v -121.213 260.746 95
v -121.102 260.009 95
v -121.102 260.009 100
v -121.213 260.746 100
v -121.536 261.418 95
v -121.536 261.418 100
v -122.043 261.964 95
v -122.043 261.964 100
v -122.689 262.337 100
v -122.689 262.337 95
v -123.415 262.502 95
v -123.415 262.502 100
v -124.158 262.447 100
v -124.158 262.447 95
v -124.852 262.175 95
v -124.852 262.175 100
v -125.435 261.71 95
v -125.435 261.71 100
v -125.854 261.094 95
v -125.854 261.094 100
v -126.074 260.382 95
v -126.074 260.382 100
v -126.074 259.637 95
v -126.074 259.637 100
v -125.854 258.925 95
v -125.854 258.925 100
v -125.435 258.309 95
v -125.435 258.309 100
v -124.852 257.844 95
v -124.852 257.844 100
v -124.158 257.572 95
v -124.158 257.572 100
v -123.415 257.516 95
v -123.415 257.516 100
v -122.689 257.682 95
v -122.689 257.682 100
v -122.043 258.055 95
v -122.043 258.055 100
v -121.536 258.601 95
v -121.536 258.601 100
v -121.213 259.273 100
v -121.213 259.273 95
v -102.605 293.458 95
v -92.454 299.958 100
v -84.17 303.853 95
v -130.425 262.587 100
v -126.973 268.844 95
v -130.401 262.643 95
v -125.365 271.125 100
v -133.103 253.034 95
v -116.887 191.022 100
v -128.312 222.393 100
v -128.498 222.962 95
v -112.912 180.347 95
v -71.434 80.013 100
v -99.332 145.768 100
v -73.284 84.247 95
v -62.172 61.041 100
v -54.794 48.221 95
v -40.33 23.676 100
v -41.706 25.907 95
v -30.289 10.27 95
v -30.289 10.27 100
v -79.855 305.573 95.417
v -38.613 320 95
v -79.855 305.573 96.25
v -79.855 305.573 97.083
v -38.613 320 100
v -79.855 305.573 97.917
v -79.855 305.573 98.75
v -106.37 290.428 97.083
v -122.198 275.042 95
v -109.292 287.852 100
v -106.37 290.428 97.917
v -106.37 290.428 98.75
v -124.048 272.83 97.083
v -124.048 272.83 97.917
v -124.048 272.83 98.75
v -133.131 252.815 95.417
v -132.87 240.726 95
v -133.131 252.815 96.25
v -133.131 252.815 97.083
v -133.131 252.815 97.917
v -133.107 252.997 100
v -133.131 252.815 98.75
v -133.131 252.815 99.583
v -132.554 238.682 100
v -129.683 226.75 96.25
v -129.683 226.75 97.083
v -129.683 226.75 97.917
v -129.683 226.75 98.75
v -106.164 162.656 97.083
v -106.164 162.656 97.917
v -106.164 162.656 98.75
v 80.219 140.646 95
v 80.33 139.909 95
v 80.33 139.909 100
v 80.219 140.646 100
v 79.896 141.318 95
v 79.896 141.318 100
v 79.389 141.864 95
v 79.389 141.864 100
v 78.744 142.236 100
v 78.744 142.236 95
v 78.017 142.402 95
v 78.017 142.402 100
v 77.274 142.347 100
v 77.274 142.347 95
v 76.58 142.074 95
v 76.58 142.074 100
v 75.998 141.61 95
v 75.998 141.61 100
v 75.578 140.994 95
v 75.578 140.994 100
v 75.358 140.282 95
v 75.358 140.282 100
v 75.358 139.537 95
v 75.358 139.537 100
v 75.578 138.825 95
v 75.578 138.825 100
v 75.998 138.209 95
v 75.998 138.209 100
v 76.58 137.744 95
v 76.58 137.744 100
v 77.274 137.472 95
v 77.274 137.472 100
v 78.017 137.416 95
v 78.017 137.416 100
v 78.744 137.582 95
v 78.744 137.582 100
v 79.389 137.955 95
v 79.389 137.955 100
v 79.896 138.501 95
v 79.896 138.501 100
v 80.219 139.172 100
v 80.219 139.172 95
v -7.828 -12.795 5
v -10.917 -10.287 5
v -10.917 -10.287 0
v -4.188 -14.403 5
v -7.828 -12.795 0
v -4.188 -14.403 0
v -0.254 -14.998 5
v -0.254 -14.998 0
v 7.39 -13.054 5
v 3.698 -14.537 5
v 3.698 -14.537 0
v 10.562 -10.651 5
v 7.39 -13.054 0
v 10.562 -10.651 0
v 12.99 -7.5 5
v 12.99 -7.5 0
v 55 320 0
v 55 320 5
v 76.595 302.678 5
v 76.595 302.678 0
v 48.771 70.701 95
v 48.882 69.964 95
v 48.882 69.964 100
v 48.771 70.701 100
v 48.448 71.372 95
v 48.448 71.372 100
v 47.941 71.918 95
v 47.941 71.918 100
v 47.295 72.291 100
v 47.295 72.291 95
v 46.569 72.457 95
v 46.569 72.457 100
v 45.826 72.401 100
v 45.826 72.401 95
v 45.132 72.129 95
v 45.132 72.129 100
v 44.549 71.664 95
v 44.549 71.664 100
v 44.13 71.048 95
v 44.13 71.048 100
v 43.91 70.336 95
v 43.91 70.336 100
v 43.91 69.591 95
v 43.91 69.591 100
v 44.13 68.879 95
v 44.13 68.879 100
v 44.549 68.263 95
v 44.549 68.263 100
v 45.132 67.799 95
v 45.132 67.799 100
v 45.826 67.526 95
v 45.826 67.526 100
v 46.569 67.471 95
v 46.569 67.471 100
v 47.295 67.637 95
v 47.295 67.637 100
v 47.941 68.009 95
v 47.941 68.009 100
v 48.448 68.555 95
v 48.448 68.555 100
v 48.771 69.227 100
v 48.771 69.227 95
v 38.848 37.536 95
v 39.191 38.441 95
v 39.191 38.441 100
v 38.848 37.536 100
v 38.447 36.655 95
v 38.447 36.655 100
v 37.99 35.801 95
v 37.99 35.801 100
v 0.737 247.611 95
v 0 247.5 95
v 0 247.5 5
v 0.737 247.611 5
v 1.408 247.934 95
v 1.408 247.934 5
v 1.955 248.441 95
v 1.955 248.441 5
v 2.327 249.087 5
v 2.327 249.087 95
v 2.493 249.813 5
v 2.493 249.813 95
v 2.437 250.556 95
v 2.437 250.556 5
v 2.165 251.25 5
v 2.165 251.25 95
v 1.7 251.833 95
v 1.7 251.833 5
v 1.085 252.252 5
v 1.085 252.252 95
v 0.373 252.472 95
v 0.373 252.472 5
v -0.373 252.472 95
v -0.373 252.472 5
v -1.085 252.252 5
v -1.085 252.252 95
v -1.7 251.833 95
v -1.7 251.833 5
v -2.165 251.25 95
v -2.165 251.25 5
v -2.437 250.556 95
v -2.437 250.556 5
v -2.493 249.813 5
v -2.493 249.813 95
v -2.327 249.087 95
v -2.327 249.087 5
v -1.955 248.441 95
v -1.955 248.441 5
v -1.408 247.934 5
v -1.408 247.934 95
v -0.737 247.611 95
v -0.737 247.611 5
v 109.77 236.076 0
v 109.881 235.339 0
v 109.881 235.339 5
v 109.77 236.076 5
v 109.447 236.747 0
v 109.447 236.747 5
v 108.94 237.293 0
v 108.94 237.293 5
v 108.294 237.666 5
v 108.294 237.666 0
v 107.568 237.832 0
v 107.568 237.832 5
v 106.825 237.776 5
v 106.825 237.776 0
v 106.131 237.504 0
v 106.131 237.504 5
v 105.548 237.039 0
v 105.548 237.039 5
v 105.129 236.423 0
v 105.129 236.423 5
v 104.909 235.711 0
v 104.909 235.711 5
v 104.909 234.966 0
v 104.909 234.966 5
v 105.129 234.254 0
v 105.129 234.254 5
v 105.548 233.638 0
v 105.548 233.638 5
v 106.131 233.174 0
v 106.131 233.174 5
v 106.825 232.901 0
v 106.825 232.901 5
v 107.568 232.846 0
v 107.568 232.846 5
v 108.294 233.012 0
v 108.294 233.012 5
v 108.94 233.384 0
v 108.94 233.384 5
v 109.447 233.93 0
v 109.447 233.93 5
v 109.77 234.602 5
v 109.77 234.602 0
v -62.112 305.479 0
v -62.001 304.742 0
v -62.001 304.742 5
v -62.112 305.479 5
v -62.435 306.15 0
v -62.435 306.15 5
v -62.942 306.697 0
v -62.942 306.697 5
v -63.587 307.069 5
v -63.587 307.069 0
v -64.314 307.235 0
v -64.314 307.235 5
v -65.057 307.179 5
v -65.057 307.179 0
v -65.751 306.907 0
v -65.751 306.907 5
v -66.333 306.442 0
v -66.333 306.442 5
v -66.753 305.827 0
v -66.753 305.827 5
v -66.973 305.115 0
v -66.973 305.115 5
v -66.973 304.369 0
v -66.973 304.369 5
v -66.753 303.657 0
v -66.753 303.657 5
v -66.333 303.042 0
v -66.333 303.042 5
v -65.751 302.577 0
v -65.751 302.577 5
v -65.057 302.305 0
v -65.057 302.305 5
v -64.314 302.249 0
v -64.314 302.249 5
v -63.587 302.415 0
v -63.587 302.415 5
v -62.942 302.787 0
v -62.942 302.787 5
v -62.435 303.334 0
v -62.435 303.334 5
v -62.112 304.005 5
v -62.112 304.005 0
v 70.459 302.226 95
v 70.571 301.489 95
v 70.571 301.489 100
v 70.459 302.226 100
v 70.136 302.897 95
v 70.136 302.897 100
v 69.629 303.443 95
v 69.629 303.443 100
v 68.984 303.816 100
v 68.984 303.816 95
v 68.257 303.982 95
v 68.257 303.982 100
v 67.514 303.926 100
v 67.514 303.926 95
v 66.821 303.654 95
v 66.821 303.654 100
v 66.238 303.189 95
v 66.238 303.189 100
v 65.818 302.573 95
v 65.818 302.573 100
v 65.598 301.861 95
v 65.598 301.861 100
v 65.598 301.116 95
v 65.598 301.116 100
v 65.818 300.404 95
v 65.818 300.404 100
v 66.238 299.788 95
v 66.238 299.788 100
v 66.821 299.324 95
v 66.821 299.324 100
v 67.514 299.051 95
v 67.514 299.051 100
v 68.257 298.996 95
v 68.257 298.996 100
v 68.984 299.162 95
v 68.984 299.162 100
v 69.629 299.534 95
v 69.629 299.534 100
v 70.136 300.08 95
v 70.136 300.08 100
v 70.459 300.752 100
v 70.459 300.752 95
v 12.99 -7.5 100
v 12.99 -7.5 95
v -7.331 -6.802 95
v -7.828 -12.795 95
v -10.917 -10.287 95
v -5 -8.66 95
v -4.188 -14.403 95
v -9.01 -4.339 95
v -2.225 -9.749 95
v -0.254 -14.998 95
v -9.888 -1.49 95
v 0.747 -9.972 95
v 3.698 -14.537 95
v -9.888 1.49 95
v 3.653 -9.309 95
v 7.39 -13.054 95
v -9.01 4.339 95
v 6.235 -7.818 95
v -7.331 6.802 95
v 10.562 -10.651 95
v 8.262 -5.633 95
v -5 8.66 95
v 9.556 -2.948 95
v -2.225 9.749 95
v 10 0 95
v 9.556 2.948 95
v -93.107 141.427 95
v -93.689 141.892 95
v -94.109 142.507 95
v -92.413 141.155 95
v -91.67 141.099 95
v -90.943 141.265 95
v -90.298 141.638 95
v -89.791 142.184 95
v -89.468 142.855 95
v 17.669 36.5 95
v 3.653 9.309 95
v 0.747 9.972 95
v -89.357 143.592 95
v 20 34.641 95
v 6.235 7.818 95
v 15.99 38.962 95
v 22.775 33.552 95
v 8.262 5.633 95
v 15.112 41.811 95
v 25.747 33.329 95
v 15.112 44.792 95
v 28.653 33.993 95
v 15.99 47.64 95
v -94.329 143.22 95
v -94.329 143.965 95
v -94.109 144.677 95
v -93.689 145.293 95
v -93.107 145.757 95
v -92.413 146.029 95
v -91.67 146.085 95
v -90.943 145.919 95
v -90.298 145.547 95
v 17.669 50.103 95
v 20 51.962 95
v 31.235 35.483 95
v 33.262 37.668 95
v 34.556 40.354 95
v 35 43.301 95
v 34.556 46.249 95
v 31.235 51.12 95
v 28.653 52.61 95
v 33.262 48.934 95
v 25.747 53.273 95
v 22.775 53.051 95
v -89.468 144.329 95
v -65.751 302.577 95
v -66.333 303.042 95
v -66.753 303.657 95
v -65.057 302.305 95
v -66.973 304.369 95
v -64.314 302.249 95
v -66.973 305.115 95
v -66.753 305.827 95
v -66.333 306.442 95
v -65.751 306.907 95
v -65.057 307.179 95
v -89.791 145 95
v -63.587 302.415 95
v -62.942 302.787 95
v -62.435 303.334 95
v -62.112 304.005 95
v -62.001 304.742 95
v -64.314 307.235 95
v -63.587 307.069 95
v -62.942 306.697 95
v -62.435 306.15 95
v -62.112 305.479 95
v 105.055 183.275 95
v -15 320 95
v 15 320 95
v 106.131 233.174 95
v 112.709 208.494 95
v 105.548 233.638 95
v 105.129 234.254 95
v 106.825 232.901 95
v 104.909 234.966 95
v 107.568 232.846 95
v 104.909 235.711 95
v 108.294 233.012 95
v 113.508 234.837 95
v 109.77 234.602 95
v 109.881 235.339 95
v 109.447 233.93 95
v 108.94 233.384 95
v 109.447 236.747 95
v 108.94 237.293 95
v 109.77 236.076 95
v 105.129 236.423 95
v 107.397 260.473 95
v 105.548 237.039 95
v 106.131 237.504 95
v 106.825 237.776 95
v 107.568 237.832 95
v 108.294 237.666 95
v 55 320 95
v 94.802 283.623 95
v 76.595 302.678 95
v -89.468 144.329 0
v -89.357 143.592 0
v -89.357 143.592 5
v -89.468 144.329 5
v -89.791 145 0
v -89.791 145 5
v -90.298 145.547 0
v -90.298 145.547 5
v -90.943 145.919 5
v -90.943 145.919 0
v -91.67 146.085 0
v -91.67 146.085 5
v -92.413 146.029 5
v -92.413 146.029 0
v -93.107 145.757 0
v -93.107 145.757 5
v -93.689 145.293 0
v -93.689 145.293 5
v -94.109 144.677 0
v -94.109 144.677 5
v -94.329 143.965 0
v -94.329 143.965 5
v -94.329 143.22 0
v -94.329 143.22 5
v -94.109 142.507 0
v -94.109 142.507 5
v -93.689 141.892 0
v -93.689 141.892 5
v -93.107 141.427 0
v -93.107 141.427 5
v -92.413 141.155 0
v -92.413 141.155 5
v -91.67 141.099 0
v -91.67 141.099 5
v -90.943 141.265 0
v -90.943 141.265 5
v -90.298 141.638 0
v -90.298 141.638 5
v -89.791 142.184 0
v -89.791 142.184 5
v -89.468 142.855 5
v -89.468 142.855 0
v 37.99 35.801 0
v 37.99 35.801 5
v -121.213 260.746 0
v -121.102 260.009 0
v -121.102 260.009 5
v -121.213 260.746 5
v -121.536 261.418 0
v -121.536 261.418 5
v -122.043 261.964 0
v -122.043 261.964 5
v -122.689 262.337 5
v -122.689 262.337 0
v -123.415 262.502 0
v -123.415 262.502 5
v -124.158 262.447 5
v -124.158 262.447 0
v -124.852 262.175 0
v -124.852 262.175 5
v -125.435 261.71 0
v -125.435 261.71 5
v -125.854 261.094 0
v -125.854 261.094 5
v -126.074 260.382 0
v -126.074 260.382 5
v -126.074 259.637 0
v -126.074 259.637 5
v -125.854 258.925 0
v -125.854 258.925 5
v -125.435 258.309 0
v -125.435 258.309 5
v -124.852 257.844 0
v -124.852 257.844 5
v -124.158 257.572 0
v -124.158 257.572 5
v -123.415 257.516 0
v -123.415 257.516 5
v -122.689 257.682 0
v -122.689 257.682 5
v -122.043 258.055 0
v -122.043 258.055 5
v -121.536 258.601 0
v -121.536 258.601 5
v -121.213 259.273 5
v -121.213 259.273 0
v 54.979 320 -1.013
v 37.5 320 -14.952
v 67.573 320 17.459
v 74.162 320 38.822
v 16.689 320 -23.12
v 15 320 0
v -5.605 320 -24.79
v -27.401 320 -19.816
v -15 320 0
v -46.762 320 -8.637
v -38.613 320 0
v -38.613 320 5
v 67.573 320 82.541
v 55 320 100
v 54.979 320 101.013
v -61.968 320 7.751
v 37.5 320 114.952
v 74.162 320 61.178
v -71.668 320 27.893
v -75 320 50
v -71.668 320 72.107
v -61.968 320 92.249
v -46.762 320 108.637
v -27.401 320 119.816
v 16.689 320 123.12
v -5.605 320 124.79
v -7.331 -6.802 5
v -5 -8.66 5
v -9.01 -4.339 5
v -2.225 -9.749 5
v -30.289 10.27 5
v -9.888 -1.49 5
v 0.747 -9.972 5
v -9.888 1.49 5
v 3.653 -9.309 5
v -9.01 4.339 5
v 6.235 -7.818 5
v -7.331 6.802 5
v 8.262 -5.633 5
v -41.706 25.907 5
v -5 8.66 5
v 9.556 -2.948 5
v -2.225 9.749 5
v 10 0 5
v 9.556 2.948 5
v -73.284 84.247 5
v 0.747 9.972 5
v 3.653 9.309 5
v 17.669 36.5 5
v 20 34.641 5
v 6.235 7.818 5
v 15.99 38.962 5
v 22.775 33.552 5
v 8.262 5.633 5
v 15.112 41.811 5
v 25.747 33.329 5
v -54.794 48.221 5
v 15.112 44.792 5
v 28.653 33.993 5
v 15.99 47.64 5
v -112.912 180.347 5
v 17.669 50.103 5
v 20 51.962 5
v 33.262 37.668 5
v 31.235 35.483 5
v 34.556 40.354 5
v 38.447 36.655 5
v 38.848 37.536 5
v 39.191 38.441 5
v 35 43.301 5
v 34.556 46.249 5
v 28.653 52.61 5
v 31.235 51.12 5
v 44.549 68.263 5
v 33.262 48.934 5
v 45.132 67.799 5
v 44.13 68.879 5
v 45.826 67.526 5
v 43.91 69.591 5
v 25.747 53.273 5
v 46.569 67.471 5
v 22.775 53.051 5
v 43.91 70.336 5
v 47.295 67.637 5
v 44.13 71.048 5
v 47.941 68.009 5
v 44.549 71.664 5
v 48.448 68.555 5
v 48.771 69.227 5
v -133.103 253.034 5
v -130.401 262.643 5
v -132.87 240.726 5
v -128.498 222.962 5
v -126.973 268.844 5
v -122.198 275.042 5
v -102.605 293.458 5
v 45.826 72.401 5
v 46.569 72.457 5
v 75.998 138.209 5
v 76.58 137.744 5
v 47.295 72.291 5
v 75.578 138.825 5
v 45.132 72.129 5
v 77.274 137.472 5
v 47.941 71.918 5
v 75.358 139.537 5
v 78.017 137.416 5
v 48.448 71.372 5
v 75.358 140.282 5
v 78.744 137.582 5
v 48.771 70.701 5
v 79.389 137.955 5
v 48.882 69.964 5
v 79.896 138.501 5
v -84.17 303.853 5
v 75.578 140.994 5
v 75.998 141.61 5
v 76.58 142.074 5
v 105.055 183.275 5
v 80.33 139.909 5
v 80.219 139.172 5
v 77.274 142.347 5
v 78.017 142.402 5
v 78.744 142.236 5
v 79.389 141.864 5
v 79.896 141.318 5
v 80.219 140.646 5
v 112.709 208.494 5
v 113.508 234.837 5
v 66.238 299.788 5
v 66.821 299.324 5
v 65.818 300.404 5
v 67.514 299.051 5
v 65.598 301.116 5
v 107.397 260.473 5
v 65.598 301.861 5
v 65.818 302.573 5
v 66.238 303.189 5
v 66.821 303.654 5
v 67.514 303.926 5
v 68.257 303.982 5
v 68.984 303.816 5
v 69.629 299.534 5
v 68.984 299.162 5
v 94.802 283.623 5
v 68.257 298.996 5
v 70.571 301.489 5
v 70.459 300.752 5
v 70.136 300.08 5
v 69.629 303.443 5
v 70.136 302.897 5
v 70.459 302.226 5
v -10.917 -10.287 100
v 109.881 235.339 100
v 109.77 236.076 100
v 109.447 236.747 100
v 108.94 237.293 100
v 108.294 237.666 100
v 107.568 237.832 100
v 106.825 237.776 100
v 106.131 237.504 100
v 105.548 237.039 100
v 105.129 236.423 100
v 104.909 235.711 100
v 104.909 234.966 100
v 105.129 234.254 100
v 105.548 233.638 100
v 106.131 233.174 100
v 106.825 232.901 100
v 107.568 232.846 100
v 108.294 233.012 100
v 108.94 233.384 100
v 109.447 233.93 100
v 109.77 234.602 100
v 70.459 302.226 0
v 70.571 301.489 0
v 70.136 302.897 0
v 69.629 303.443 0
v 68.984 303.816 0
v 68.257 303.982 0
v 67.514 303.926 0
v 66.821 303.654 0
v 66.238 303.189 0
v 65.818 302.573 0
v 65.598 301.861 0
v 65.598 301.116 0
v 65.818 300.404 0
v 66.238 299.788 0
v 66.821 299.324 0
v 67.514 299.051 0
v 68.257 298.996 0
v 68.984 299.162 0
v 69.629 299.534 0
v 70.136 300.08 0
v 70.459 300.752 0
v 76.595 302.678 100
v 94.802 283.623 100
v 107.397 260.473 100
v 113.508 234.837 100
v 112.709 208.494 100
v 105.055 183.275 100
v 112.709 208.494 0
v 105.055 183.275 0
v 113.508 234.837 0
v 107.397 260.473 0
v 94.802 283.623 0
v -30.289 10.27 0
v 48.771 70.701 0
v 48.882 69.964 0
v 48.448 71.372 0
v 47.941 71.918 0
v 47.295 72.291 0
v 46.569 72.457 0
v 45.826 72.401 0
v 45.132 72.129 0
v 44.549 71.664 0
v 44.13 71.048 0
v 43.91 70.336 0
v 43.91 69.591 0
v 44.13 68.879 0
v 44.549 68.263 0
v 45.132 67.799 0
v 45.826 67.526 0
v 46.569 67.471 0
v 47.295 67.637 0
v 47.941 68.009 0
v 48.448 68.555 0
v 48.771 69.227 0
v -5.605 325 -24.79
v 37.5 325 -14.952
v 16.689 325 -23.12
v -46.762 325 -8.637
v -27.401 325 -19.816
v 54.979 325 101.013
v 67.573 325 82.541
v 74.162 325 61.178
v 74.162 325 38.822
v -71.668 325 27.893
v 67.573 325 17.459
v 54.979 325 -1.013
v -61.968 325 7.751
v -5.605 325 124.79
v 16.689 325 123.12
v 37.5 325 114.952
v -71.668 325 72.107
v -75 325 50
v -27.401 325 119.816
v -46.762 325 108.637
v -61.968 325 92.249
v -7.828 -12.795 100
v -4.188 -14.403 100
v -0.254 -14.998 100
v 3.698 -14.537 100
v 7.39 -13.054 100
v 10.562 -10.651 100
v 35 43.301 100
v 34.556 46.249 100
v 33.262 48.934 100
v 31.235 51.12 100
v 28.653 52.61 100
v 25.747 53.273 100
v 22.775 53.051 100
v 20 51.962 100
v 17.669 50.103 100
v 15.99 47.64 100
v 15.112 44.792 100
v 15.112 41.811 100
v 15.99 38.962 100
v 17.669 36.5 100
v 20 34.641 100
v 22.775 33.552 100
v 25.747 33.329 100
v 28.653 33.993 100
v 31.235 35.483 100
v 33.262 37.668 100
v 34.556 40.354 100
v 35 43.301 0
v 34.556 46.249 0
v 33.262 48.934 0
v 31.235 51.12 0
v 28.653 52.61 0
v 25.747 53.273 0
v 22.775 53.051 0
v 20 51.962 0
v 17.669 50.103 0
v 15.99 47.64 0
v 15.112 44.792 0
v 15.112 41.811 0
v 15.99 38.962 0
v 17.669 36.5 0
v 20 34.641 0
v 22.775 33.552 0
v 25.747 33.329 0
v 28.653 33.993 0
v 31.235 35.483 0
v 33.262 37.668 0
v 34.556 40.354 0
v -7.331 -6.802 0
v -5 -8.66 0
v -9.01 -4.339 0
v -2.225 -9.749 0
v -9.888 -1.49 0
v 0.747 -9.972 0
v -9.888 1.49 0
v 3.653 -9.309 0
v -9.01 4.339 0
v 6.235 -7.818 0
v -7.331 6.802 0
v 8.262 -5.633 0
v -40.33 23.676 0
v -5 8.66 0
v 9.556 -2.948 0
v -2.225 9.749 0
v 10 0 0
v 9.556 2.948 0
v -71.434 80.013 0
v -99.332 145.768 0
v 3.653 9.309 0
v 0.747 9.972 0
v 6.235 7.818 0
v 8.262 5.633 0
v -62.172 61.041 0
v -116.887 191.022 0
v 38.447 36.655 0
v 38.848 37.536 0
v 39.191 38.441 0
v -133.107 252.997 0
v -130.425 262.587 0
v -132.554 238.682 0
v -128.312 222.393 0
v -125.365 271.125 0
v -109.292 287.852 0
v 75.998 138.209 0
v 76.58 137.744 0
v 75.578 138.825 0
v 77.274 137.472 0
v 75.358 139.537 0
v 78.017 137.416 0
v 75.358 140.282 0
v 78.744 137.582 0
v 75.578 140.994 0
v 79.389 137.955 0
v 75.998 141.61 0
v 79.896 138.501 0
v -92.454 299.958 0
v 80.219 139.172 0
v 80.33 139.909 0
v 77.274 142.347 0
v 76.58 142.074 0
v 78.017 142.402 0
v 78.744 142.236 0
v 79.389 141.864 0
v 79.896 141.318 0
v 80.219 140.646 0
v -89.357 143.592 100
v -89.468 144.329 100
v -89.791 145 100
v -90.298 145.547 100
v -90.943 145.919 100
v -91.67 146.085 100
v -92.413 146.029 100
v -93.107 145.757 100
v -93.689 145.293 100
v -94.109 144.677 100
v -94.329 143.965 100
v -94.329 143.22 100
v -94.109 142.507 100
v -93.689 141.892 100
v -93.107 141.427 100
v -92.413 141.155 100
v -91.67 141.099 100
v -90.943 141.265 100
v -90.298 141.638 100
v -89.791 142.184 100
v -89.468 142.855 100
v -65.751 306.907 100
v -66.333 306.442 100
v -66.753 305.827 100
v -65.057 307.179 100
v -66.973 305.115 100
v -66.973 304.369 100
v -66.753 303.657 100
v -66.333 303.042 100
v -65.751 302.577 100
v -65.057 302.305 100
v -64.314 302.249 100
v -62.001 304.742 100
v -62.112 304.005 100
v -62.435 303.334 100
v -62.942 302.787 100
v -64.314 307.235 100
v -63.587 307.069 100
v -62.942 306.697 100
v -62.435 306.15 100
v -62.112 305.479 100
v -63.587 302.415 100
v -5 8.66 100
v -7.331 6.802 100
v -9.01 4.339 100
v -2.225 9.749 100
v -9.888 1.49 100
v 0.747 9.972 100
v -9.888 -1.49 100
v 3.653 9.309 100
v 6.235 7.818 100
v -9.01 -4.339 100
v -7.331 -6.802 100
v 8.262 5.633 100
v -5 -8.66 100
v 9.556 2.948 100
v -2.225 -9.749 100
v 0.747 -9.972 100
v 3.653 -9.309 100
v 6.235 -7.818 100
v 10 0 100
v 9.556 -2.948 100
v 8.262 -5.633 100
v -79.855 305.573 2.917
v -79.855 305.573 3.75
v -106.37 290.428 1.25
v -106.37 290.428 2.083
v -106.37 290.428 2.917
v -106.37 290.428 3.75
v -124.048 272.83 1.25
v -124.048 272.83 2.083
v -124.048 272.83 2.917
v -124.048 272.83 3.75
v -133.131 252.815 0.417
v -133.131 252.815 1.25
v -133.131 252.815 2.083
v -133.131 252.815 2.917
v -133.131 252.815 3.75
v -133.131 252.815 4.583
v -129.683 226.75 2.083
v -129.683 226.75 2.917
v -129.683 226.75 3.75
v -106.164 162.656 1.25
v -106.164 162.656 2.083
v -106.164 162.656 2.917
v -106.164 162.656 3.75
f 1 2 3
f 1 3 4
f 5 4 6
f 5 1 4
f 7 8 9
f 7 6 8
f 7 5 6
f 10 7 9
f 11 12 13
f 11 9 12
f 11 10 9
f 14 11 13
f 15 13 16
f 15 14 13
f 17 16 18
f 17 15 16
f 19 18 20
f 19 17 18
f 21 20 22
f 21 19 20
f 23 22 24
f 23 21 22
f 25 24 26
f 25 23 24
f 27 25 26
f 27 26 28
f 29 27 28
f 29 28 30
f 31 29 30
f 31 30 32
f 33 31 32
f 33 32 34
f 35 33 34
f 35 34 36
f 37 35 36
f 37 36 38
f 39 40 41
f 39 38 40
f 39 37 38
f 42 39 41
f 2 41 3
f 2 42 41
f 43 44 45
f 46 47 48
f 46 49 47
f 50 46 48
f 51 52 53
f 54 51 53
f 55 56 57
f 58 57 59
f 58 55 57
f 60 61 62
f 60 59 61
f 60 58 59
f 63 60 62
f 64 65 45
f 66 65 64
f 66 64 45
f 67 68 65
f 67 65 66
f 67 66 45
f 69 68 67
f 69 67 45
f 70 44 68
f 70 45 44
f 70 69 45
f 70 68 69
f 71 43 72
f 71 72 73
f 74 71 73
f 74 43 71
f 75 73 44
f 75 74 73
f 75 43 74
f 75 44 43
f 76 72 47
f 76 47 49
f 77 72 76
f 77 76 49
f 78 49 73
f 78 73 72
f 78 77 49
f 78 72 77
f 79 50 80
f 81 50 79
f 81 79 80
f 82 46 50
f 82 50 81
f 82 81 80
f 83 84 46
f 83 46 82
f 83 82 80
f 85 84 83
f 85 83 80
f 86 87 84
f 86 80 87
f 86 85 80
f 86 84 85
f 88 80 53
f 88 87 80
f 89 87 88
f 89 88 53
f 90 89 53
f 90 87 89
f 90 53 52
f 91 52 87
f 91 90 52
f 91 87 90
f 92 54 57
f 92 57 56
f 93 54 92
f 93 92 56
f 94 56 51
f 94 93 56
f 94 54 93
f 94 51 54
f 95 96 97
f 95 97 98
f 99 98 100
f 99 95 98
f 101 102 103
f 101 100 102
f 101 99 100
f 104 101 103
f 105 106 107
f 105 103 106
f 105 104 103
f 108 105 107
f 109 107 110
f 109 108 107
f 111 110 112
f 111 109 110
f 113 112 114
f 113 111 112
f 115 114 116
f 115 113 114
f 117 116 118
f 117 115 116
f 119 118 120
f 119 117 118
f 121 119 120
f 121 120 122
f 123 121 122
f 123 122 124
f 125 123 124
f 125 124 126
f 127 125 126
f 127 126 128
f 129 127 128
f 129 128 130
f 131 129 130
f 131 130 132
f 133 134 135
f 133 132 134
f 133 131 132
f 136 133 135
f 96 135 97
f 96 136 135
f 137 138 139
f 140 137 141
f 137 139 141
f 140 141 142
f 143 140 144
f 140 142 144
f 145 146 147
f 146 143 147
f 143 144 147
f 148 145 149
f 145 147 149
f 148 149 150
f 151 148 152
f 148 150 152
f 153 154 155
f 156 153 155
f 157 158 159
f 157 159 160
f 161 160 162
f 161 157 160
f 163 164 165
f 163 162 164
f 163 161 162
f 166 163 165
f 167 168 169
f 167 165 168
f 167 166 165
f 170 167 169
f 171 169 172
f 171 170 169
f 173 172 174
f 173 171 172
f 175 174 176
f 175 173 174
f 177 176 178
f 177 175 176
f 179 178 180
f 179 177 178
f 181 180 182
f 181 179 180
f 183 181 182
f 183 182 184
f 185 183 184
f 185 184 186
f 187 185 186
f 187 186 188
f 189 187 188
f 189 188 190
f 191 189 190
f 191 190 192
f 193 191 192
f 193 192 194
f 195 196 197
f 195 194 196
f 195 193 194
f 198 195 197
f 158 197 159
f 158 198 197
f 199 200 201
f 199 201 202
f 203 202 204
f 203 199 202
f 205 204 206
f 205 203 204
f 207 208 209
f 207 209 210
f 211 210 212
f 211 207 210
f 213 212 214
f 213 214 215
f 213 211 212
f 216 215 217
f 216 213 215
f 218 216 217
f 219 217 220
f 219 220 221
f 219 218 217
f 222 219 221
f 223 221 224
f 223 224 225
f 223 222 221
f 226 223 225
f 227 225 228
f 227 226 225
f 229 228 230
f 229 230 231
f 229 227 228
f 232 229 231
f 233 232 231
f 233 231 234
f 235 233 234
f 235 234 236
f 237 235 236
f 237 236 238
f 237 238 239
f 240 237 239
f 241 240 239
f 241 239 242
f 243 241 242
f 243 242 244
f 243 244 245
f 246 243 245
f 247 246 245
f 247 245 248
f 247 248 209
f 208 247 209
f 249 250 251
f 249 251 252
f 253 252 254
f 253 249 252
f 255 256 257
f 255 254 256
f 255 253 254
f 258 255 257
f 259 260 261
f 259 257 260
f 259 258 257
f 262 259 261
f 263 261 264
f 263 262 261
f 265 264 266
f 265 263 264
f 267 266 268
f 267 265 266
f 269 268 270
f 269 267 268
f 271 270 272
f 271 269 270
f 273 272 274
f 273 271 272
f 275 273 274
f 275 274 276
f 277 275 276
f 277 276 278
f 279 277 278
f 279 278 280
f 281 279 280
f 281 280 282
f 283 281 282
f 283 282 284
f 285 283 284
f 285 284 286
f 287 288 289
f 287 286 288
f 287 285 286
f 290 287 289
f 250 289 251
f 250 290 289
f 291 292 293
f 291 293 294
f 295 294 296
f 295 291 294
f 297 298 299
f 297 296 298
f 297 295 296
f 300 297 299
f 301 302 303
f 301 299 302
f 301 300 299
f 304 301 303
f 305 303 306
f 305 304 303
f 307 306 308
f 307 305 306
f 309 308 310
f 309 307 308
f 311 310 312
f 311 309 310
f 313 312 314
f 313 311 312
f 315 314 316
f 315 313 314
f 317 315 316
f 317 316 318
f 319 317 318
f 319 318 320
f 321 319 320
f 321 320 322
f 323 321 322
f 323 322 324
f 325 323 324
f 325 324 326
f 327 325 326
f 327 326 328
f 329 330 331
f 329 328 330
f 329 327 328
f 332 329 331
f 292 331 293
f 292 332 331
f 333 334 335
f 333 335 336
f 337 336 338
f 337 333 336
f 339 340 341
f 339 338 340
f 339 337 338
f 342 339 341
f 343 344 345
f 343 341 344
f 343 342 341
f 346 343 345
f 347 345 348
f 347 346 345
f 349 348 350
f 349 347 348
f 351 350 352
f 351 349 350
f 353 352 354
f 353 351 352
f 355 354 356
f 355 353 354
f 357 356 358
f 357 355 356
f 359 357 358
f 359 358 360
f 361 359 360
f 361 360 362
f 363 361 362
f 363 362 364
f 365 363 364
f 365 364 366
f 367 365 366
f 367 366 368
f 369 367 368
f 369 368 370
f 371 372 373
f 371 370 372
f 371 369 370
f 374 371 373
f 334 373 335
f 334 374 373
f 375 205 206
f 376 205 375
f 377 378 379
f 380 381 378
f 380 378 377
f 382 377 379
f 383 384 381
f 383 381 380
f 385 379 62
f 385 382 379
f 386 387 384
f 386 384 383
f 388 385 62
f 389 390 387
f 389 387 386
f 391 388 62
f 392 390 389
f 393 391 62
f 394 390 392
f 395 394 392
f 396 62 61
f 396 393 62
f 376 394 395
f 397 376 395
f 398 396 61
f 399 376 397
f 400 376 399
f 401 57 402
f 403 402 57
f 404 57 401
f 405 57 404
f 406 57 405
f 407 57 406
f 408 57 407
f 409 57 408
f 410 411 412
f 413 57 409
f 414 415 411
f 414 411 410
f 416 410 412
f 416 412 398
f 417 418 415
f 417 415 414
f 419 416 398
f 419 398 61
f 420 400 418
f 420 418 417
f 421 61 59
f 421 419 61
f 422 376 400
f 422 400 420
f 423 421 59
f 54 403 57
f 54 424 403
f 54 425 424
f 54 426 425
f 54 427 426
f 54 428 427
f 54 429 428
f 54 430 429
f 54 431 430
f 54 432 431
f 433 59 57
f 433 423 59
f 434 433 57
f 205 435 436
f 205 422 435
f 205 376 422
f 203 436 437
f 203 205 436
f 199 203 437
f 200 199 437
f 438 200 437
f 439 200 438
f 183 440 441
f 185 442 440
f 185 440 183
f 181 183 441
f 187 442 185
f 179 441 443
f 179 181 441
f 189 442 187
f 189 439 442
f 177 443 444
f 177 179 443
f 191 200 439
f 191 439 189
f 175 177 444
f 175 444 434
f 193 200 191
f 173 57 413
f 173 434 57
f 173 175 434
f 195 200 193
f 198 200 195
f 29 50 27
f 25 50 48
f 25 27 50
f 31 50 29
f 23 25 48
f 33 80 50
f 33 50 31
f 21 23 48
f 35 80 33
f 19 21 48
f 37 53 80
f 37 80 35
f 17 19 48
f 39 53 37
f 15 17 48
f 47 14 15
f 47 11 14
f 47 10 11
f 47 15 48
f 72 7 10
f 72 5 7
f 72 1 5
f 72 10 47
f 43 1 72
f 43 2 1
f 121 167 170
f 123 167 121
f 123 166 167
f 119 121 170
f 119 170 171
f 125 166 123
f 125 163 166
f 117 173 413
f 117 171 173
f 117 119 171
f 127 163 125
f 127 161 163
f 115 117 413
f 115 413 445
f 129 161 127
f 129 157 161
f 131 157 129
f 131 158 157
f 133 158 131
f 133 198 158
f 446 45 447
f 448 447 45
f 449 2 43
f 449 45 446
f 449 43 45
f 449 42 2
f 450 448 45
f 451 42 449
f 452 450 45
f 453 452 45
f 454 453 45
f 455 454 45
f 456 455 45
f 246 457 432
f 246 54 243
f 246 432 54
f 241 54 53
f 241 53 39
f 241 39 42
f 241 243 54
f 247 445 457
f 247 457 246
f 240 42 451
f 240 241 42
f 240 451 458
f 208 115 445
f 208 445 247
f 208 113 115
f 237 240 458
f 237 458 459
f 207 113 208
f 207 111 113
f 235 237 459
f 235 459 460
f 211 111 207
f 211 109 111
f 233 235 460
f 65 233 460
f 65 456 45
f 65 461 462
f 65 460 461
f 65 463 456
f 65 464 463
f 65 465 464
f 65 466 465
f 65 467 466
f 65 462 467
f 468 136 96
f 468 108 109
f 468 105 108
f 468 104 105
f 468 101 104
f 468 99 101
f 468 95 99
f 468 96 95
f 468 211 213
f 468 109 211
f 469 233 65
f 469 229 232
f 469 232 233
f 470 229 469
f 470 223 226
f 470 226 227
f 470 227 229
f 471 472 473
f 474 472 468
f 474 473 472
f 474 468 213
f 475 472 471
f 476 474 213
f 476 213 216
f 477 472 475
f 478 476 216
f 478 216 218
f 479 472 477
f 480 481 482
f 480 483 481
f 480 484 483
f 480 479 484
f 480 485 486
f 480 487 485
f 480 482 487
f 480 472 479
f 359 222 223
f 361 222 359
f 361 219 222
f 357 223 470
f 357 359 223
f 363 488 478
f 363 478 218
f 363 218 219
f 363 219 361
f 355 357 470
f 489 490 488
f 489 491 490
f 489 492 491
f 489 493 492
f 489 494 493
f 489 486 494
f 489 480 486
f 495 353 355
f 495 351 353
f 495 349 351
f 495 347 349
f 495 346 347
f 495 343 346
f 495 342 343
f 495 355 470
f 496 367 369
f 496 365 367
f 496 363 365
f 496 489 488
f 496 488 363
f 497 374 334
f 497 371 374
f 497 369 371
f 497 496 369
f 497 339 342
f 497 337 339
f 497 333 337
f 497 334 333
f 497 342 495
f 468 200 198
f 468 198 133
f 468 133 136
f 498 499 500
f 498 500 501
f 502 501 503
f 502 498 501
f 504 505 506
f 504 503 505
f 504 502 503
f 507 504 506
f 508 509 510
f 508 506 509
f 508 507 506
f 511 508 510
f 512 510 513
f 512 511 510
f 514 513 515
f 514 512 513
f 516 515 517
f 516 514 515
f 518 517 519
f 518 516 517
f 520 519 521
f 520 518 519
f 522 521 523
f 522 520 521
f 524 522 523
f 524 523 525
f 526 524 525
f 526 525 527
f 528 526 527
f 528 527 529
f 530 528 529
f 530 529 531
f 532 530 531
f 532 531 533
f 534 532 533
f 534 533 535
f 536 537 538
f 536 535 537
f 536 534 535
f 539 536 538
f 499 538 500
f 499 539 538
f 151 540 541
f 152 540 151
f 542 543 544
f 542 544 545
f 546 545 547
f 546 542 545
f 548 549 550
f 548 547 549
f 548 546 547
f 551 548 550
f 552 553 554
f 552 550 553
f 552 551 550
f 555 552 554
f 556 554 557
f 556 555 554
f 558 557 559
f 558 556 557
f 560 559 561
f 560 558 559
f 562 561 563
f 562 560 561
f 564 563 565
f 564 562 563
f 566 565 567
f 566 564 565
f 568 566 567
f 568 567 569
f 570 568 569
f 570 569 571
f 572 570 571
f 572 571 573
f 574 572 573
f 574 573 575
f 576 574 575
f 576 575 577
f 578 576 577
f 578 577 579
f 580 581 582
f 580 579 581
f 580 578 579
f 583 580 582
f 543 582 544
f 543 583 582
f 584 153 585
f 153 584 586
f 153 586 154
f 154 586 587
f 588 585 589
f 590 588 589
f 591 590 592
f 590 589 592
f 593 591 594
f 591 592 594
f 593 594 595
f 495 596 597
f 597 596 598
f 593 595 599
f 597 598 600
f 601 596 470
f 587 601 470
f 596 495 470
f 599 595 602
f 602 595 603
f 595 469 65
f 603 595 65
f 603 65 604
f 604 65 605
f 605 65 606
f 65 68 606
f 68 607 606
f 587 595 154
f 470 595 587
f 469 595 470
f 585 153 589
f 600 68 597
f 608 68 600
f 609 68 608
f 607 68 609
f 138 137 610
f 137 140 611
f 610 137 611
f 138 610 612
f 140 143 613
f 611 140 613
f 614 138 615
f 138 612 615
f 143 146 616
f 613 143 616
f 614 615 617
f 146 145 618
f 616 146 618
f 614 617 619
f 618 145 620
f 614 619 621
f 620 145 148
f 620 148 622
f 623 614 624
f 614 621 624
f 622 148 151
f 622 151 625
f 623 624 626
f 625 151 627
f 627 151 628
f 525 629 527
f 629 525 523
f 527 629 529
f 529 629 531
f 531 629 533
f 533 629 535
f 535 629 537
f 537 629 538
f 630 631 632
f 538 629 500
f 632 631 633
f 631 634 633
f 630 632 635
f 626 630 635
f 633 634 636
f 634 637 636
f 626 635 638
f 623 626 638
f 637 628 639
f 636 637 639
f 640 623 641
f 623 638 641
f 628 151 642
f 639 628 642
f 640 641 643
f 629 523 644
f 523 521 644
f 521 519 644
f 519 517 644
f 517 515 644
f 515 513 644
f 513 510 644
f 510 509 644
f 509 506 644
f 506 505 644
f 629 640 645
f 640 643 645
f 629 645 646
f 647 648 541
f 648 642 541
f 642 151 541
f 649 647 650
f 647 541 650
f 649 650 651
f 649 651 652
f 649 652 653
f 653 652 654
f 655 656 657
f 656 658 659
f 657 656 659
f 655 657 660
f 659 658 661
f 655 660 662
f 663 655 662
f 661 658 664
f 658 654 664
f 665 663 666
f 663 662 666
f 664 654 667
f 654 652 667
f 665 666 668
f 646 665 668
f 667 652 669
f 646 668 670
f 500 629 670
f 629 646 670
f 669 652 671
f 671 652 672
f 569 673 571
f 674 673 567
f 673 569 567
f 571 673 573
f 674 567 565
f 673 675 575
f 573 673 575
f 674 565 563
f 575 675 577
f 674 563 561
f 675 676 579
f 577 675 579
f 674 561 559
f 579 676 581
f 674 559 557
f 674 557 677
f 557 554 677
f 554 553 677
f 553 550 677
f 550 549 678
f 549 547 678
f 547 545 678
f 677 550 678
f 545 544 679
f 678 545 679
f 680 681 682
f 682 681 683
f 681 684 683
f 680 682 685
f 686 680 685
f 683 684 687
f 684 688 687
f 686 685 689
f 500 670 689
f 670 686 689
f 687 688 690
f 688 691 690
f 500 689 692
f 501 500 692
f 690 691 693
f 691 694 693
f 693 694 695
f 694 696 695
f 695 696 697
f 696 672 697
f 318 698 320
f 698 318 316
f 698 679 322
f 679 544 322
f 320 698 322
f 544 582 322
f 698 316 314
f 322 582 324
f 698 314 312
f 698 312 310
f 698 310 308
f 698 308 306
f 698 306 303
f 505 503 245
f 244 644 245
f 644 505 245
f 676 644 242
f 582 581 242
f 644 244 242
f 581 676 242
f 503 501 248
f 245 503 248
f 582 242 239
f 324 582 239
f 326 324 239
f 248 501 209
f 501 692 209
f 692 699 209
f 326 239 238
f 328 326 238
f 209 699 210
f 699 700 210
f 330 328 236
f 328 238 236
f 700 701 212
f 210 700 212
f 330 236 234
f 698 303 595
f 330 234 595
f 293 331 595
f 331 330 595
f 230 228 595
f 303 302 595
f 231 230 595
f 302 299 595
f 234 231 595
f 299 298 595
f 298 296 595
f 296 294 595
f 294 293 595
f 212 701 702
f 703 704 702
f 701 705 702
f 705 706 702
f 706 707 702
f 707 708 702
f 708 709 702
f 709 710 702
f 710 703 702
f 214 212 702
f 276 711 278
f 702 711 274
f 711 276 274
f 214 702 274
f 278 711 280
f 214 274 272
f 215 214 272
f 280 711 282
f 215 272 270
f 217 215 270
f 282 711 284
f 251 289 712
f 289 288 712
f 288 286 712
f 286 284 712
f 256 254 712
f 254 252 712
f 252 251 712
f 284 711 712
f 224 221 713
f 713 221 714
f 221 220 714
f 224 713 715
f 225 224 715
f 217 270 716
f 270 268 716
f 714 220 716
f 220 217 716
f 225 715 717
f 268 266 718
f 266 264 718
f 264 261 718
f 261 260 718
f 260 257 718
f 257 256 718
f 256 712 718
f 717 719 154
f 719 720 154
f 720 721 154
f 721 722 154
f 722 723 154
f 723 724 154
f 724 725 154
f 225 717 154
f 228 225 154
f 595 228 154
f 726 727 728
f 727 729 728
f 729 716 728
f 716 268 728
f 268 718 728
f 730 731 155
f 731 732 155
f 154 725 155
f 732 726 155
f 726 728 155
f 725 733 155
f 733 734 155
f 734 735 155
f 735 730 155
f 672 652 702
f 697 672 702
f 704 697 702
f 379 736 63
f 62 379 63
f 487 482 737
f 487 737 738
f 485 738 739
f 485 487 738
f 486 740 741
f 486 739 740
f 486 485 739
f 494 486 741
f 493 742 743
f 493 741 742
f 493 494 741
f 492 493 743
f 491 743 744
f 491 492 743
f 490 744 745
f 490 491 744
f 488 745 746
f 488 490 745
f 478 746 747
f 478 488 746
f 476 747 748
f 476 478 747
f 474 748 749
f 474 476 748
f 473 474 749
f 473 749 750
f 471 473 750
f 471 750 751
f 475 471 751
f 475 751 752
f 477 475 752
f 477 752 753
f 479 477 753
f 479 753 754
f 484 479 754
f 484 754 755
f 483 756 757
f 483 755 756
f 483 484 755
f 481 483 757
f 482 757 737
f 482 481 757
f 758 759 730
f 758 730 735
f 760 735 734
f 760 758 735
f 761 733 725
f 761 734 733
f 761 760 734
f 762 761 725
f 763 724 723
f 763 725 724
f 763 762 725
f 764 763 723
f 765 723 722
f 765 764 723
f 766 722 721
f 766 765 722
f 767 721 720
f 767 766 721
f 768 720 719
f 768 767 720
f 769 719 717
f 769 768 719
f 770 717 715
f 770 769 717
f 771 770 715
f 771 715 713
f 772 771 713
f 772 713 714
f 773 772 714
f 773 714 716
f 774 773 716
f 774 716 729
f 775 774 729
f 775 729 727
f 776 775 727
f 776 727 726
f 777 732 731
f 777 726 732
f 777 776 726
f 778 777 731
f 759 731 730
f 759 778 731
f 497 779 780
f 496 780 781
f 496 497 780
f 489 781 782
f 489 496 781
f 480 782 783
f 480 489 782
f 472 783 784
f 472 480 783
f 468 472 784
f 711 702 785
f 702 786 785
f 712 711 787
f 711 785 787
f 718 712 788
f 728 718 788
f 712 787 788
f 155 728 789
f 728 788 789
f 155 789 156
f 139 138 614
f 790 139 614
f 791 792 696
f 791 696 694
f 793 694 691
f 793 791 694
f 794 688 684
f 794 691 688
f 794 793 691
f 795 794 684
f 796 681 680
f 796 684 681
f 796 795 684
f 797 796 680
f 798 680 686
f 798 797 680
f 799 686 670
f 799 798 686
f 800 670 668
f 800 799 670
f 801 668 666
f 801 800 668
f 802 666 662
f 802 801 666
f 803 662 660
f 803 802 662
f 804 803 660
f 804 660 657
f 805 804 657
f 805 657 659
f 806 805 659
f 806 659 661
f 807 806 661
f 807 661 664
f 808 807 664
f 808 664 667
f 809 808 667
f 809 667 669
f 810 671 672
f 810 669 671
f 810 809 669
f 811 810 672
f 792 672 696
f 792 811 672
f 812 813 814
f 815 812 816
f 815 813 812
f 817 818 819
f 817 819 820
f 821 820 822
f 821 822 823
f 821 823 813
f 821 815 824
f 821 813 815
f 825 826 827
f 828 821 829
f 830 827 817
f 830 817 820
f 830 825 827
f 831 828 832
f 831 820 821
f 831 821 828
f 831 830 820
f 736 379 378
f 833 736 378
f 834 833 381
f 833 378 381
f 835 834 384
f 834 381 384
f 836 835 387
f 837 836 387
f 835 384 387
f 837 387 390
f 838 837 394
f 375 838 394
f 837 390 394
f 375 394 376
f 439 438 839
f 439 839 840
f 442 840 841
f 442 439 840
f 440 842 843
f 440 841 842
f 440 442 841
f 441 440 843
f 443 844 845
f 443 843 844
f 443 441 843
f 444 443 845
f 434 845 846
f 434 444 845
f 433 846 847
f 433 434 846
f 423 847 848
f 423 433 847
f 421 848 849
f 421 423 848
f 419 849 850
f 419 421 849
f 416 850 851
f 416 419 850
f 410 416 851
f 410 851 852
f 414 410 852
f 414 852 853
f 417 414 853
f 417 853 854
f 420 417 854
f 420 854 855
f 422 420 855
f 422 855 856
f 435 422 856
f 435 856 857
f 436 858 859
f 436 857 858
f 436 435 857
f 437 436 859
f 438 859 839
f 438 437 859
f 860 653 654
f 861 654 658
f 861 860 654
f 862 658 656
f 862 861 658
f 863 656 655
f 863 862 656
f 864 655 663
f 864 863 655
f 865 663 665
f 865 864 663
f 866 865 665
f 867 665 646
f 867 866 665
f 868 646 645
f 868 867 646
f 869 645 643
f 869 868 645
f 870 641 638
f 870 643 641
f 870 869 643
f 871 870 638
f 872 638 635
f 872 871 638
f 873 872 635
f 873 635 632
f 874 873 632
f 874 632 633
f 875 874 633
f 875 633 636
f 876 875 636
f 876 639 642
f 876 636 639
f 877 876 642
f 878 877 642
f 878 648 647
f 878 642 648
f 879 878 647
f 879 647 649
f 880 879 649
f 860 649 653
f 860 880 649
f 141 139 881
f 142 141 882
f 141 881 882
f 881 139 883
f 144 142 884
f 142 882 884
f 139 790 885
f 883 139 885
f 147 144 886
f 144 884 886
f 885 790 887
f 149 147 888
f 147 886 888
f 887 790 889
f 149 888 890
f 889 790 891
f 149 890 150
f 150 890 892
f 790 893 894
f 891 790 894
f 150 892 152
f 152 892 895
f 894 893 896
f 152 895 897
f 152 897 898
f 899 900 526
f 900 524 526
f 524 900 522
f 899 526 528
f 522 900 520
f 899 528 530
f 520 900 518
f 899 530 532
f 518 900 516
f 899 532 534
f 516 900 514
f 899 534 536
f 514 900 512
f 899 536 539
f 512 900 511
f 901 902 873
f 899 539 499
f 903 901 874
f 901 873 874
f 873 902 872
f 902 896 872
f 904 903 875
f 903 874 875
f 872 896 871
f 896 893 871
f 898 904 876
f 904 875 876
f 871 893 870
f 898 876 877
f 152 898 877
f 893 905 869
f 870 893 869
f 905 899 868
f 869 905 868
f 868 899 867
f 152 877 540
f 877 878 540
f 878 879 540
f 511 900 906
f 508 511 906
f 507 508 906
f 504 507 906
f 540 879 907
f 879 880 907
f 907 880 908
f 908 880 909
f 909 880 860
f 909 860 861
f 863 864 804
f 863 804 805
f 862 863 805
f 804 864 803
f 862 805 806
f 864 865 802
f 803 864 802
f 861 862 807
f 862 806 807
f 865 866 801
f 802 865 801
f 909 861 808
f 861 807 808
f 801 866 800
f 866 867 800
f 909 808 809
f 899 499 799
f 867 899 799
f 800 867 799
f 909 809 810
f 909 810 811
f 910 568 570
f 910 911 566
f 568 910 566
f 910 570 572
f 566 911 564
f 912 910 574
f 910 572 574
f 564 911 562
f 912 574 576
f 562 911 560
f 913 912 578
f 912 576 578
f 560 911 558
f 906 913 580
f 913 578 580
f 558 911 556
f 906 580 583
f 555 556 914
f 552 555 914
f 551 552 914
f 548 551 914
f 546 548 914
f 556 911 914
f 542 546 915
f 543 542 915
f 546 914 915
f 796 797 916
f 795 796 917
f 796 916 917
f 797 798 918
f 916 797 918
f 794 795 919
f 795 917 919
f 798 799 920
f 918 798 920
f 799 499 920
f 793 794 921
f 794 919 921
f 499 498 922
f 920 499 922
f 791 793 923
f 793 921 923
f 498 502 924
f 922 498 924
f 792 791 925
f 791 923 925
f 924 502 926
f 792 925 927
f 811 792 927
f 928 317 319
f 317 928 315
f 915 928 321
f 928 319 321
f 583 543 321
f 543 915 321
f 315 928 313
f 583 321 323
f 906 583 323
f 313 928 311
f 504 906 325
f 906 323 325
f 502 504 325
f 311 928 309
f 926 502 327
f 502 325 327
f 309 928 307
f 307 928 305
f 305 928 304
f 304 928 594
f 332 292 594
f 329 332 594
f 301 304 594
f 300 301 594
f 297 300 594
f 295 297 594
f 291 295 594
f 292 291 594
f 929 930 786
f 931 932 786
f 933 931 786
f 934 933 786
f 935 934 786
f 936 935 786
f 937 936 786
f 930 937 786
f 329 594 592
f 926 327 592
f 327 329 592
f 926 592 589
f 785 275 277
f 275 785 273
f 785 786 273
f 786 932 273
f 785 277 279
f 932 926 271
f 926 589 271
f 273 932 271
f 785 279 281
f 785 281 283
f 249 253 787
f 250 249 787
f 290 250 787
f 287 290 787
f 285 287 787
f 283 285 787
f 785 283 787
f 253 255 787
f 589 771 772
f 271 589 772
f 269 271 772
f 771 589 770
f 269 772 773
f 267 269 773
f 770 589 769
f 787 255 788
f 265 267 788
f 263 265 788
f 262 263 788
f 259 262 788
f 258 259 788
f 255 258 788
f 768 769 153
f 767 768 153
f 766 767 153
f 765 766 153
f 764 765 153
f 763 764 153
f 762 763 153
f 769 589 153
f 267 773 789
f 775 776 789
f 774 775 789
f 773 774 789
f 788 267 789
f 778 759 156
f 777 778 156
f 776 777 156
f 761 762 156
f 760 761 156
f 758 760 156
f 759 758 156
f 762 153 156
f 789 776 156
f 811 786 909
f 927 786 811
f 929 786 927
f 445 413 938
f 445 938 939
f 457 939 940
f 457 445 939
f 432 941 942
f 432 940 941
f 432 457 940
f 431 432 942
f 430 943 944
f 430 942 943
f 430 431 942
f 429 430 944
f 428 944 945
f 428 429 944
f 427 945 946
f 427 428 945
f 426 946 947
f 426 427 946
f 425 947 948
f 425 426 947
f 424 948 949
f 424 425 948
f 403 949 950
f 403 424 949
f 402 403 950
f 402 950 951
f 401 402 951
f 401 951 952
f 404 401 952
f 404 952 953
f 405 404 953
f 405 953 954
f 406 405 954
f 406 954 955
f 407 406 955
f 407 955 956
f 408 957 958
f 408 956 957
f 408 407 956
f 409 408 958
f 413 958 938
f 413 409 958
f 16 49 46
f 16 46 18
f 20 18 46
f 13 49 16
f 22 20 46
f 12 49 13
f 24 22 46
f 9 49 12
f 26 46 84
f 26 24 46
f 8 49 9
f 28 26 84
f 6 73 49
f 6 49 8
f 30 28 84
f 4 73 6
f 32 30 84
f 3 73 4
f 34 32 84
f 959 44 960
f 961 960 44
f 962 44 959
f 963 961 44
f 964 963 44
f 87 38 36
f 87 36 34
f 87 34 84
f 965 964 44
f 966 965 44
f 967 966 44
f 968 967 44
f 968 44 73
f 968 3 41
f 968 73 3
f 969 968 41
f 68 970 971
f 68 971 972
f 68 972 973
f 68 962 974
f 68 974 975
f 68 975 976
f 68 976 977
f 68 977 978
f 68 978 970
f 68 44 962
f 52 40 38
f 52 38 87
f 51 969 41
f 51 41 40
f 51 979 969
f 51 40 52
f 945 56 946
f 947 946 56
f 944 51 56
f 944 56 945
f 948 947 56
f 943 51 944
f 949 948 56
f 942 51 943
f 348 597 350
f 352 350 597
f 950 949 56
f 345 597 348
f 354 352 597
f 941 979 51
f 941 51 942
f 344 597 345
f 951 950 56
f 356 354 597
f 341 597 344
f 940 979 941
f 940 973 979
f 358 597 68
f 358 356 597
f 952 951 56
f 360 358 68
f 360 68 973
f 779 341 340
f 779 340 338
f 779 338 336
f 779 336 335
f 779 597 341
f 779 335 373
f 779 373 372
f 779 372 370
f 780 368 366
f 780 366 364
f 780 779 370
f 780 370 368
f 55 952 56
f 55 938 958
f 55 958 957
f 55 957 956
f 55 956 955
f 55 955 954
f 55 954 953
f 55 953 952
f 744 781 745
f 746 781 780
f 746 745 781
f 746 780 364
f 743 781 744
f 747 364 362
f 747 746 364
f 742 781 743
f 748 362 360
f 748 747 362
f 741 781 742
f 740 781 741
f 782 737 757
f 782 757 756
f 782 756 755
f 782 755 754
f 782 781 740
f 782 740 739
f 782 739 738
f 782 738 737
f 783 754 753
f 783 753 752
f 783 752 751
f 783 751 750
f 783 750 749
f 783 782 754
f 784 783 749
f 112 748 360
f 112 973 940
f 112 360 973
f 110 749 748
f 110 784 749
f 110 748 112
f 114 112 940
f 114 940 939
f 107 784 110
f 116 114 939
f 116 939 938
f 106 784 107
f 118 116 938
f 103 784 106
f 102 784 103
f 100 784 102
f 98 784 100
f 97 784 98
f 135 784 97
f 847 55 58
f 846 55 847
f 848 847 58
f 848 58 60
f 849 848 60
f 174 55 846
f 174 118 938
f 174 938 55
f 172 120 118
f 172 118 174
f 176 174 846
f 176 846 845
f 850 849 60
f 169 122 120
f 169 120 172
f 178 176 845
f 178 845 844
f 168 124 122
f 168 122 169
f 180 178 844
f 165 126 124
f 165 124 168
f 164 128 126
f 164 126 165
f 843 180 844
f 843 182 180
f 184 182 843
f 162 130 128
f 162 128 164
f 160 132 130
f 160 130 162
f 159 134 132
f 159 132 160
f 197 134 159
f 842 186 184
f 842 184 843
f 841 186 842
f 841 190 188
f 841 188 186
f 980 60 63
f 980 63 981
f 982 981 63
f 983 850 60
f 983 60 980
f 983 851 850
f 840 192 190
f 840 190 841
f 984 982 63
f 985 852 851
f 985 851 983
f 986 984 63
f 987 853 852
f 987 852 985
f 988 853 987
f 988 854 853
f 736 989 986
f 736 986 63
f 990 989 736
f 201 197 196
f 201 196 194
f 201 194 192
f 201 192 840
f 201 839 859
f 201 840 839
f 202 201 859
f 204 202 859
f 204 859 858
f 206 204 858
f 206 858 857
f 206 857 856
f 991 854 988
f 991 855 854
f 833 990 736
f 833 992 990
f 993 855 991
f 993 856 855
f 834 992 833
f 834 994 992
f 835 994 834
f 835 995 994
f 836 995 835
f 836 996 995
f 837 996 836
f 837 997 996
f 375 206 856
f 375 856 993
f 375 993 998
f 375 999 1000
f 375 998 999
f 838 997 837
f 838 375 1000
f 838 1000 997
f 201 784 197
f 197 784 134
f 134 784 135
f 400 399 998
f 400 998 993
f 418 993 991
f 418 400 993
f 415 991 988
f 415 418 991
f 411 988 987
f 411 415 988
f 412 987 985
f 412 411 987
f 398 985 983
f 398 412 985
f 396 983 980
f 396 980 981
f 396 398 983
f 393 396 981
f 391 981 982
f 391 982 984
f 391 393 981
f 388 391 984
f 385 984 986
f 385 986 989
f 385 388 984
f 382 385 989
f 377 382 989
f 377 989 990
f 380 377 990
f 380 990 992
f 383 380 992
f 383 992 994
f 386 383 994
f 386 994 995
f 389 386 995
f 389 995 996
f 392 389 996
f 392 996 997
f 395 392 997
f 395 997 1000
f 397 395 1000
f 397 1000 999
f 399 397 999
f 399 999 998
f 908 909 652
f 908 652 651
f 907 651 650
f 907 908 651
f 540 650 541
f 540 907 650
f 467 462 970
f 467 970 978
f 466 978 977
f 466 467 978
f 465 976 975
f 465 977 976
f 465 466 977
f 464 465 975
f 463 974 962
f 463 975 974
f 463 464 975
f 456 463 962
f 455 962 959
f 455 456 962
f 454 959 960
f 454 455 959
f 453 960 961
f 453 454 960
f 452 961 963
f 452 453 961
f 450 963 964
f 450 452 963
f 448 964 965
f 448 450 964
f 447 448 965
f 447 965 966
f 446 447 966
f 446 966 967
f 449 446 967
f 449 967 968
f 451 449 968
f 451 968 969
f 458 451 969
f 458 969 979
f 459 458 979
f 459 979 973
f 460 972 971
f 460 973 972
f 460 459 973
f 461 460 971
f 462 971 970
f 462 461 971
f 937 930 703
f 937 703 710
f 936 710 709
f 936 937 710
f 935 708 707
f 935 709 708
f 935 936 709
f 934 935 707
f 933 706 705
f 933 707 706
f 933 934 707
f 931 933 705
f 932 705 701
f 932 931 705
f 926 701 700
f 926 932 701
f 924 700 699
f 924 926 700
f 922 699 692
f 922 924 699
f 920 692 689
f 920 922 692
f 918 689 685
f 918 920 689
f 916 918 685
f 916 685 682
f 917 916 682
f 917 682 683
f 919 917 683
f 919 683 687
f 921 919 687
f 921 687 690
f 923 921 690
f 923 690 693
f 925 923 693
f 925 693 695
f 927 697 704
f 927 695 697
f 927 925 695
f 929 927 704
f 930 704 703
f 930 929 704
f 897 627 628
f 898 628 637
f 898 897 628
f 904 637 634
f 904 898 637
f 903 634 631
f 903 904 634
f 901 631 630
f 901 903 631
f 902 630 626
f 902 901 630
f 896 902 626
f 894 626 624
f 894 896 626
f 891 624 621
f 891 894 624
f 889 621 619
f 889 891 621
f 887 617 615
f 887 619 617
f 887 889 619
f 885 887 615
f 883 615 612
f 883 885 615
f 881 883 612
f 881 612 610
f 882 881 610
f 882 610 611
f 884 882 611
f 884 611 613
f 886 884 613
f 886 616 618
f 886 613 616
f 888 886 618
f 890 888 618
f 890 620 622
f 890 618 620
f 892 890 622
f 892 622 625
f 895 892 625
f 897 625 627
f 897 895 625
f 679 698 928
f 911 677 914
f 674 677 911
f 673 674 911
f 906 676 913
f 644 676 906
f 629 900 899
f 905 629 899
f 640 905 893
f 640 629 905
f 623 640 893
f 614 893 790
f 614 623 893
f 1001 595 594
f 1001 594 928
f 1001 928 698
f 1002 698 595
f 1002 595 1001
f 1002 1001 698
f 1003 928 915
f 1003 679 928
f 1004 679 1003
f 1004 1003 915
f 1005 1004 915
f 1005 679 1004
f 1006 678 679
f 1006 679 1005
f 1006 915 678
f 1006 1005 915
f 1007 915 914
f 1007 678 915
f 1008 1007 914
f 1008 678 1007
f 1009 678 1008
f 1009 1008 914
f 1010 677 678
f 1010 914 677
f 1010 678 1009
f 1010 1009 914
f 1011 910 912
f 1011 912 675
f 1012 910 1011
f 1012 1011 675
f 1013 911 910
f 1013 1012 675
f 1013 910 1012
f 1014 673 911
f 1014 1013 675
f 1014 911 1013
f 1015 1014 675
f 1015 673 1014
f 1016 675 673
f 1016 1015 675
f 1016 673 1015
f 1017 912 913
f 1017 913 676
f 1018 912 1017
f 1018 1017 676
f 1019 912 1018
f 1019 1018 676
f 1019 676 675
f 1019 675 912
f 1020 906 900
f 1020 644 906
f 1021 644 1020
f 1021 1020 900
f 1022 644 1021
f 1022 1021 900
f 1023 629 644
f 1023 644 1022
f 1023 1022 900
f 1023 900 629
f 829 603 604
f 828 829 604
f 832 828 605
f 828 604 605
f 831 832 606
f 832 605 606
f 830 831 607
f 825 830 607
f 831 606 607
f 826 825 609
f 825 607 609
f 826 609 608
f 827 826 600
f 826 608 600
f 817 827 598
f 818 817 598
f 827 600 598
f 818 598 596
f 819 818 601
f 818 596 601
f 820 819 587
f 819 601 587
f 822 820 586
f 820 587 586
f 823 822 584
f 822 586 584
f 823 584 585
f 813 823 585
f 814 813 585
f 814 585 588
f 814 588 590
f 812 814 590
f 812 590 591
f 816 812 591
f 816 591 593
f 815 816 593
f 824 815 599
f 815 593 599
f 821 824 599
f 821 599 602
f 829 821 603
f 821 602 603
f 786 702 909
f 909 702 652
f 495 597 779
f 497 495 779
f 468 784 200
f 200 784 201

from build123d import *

# Parameters (mm, degrees)
SKETCH_1_R               = 10
EXTRUDE_1_DEPTH          = 100
EXTRUDE_START            = -100
SKETCH_2_R               = 10
EXTRUDE_2_DEPTH          = 100
EXTRUDE_6_DEPTH          = 100
CUT_EXTRUDE_1_DEPTH      = 547.260522505
CUT_EXTRUDE_1_DEPTH_BACK = 547.260522505
SKETCH_3_W               = 90
SKETCH_3_H               = 380
SKETCH_5_R               = 2.5
EXTRUDE_3_DEPTH          = 100
SKETCH_6_W               = 191.177045066
SKETCH_6_H               = 235.084722287
CUT_EXTRUDE_2_DEPTH      = 84
SKETCH_7_R               = 75
EXTRUDE_4_DEPTH          = 5
FILLET_1_R               = 100
CUT_EXTRUDE_3_DEPTH      = 372.245990354
CUT_EXTRUDE_3_DEPTH_BACK = 372.245990354
SKETCH_9_R               = 2.5


# Read off the part's stored shape, not the designer's step: 凸台-拉伸6
with BuildPart() as part:
    # 草图1 → 凸台-拉伸1 (new body)
    with BuildSketch(Plane.XY):
        with BuildLine():
            Line((-15, 500), (-15, 0))
            ThreePointArc((-15, 0), (0, -15), (15, 0))
            Line((15, 0), (15, 500))
            ThreePointArc((15, 500), (0, 515), (-15, 500))
        make_face()
        with Locations((0, 500)):
            Circle(SKETCH_1_R, mode=Mode.SUBTRACT)
        Circle(SKETCH_1_R, mode=Mode.SUBTRACT)
    extrude(amount=EXTRUDE_1_DEPTH)

    # 草图2 → 凸台-拉伸2 (add)
    with BuildSketch(Plane.XY.offset(100).offset(EXTRUDE_START)):
        with BuildLine():
            Line((15, 58.301270189), (25, 58.301270189))
            ThreePointArc((25, 58.301270189), (37.990381057, 50.801270189), (37.990381057, 35.801270189))
            Line((37.990381057, 35.801270189), (12.990381057, -7.5))
            ThreePointArc((12.990381057, -7.5), (-3.882285677, -14.488887394), (-15, 0))
            Line((-15, 0), (-15, 58.301270189))
            Line((-15, 58.301270189), (15, 58.301270189))
        make_face()
        with Locations((25, 43.301270189)):
            Circle(SKETCH_2_R, mode=Mode.SUBTRACT)
        Circle(SKETCH_2_R, mode=Mode.SUBTRACT)
    extrude(amount=EXTRUDE_2_DEPTH)

    # 凸台-拉伸6 outline → 凸台-拉伸6 (add)
    with BuildSketch(Plane(origin=(0, 0, 0), x_dir=(-1, 0, 0), z_dir=(0, 0, -1)).offset(EXTRUDE_START)):
        with BuildLine():
            add(Edge.make_bspline(
                [(38.612780637, 320), (75.136043423, 306.586029444), (91.064136582, 304.603219665), (118.984001014, 278.973676733), (129.662077412, 267.968974065), (136.038640467, 242.70657755), (120.359514298, 200.44999402), (109.589031887, 171.214421453), (103.269394168, 155.375414082), (89.549210595, 121.677121722), (65.725886592, 66.828536865), (62.106981873, 60.722826423), (38.372965569, 20.119833015), (32.80466093, 12.939929061), (30.288618585, 10.269952061)],
                knots=[0, 0, 0, 0, 0.244208219, 0.271127101, 0.397158822, 0.431429532, 0.59808024, 0.828922037, 0.865497992, 0.952912921, 0.966817851, 0.990642362, 0.993870231, 0.996118484, 0.996118484, 0.996118484, 0.996118484], degree=3))
            Line((38.612780637, 320), (15, 320))
            Line((15, 320), (15, 0))
            ThreePointArc((15, 0), (13.941832406, -5.534013839), (10.916625444, -10.28723913))
            Line((10.916625444, -10.28723913), (30.288618585, 10.269952061))
        make_face()
        with BuildLine():
            Line((-15, 58.301270189), (-15, 320))
            Line((-15, 320), (-55, 320))
            Line((-55, 320), (-137.235207142, 254.038677195))
            Line((-137.235207142, 254.038677195), (-39.190607966, 38.440545392))
            ThreePointArc((-39.190607966, 38.440545392), (-37.204730066, 52.021623624), (-25, 58.301270189))
            Line((-25, 58.301270189), (-15, 58.301270189))
        make_face()
    extrude(amount=EXTRUDE_6_DEPTH)

    # 草图3 → 切除-拉伸1 (cut, two sides: drawn at the far end of the back side and taken through both)
    with BuildSketch(Plane.ZY.offset(15).offset(-CUT_EXTRUDE_1_DEPTH_BACK)):
        with Locations((50, 150)):
            Rectangle(SKETCH_3_W, SKETCH_3_H)
    extrude(amount=CUT_EXTRUDE_1_DEPTH + CUT_EXTRUDE_1_DEPTH_BACK, mode=Mode.SUBTRACT)

    # 草图5 → 凸台-拉伸3 (add)
    with BuildSketch(Plane.XY.offset(100)):
        with Locations(Location((0, 250, 0), (0, 0, 270))):
            Circle(SKETCH_5_R)
    extrude(amount=-EXTRUDE_3_DEPTH)

    # 草图6 → 切除-拉伸2 (cut)
    with BuildSketch(Plane(origin=(15, 0, 0), x_dir=(0, 0, -1), z_dir=(1, 0, 0))):
        with Locations((-50.962374235, 437.542361144)):
            Rectangle(SKETCH_6_W, SKETCH_6_H)
    extrude(amount=-CUT_EXTRUDE_2_DEPTH, mode=Mode.SUBTRACT)

    # 草图7 → 凸台-拉伸4 (add)
    with BuildSketch(Plane(origin=(0, 320, 0), x_dir=(1, 0, 0), z_dir=(0, 1, 0))):
        with Locations(Location((0, -50, 0), (0, 0, 180))):
            Circle(SKETCH_7_R)
    extrude(amount=EXTRUDE_4_DEPTH)

    # 圆角1
    fillet_1_edges = [part.edges().sort_by_distance(p)[0] for p in [
        (137.235207142, 254.038677195, 97.5),
        (137.235207142, 254.038677195, 2.5),
    ]]
    fillet(fillet_1_edges, radius=FILLET_1_R)

    # 草图9 → 切除-拉伸3 (cut, two sides: drawn at the far end of the back side and taken through both)
    with BuildSketch(Plane.XY.offset(5).offset(-CUT_EXTRUDE_3_DEPTH_BACK)):
        with Locations((68.070503846, 301.488779743)):
            Circle(SKETCH_9_R)
        with Locations((77.830342663, 139.909225997)):
            Circle(SKETCH_9_R)
        with Locations((46.381973142, 69.963714477)):
            Circle(SKETCH_9_R)
        with Locations((-91.856835643, 143.592106289)):
            Circle(SKETCH_9_R)
        with Locations((-123.601886252, 260.009464772)):
            Circle(SKETCH_9_R)
        with Locations((-64.500640083, 304.742059349)):
            Circle(SKETCH_9_R)
        with Locations((107.380965747, 235.338761096)):
            Circle(SKETCH_9_R)
    extrude(amount=CUT_EXTRUDE_3_DEPTH + CUT_EXTRUDE_3_DEPTH_BACK, mode=Mode.SUBTRACT)


solid = part.part
